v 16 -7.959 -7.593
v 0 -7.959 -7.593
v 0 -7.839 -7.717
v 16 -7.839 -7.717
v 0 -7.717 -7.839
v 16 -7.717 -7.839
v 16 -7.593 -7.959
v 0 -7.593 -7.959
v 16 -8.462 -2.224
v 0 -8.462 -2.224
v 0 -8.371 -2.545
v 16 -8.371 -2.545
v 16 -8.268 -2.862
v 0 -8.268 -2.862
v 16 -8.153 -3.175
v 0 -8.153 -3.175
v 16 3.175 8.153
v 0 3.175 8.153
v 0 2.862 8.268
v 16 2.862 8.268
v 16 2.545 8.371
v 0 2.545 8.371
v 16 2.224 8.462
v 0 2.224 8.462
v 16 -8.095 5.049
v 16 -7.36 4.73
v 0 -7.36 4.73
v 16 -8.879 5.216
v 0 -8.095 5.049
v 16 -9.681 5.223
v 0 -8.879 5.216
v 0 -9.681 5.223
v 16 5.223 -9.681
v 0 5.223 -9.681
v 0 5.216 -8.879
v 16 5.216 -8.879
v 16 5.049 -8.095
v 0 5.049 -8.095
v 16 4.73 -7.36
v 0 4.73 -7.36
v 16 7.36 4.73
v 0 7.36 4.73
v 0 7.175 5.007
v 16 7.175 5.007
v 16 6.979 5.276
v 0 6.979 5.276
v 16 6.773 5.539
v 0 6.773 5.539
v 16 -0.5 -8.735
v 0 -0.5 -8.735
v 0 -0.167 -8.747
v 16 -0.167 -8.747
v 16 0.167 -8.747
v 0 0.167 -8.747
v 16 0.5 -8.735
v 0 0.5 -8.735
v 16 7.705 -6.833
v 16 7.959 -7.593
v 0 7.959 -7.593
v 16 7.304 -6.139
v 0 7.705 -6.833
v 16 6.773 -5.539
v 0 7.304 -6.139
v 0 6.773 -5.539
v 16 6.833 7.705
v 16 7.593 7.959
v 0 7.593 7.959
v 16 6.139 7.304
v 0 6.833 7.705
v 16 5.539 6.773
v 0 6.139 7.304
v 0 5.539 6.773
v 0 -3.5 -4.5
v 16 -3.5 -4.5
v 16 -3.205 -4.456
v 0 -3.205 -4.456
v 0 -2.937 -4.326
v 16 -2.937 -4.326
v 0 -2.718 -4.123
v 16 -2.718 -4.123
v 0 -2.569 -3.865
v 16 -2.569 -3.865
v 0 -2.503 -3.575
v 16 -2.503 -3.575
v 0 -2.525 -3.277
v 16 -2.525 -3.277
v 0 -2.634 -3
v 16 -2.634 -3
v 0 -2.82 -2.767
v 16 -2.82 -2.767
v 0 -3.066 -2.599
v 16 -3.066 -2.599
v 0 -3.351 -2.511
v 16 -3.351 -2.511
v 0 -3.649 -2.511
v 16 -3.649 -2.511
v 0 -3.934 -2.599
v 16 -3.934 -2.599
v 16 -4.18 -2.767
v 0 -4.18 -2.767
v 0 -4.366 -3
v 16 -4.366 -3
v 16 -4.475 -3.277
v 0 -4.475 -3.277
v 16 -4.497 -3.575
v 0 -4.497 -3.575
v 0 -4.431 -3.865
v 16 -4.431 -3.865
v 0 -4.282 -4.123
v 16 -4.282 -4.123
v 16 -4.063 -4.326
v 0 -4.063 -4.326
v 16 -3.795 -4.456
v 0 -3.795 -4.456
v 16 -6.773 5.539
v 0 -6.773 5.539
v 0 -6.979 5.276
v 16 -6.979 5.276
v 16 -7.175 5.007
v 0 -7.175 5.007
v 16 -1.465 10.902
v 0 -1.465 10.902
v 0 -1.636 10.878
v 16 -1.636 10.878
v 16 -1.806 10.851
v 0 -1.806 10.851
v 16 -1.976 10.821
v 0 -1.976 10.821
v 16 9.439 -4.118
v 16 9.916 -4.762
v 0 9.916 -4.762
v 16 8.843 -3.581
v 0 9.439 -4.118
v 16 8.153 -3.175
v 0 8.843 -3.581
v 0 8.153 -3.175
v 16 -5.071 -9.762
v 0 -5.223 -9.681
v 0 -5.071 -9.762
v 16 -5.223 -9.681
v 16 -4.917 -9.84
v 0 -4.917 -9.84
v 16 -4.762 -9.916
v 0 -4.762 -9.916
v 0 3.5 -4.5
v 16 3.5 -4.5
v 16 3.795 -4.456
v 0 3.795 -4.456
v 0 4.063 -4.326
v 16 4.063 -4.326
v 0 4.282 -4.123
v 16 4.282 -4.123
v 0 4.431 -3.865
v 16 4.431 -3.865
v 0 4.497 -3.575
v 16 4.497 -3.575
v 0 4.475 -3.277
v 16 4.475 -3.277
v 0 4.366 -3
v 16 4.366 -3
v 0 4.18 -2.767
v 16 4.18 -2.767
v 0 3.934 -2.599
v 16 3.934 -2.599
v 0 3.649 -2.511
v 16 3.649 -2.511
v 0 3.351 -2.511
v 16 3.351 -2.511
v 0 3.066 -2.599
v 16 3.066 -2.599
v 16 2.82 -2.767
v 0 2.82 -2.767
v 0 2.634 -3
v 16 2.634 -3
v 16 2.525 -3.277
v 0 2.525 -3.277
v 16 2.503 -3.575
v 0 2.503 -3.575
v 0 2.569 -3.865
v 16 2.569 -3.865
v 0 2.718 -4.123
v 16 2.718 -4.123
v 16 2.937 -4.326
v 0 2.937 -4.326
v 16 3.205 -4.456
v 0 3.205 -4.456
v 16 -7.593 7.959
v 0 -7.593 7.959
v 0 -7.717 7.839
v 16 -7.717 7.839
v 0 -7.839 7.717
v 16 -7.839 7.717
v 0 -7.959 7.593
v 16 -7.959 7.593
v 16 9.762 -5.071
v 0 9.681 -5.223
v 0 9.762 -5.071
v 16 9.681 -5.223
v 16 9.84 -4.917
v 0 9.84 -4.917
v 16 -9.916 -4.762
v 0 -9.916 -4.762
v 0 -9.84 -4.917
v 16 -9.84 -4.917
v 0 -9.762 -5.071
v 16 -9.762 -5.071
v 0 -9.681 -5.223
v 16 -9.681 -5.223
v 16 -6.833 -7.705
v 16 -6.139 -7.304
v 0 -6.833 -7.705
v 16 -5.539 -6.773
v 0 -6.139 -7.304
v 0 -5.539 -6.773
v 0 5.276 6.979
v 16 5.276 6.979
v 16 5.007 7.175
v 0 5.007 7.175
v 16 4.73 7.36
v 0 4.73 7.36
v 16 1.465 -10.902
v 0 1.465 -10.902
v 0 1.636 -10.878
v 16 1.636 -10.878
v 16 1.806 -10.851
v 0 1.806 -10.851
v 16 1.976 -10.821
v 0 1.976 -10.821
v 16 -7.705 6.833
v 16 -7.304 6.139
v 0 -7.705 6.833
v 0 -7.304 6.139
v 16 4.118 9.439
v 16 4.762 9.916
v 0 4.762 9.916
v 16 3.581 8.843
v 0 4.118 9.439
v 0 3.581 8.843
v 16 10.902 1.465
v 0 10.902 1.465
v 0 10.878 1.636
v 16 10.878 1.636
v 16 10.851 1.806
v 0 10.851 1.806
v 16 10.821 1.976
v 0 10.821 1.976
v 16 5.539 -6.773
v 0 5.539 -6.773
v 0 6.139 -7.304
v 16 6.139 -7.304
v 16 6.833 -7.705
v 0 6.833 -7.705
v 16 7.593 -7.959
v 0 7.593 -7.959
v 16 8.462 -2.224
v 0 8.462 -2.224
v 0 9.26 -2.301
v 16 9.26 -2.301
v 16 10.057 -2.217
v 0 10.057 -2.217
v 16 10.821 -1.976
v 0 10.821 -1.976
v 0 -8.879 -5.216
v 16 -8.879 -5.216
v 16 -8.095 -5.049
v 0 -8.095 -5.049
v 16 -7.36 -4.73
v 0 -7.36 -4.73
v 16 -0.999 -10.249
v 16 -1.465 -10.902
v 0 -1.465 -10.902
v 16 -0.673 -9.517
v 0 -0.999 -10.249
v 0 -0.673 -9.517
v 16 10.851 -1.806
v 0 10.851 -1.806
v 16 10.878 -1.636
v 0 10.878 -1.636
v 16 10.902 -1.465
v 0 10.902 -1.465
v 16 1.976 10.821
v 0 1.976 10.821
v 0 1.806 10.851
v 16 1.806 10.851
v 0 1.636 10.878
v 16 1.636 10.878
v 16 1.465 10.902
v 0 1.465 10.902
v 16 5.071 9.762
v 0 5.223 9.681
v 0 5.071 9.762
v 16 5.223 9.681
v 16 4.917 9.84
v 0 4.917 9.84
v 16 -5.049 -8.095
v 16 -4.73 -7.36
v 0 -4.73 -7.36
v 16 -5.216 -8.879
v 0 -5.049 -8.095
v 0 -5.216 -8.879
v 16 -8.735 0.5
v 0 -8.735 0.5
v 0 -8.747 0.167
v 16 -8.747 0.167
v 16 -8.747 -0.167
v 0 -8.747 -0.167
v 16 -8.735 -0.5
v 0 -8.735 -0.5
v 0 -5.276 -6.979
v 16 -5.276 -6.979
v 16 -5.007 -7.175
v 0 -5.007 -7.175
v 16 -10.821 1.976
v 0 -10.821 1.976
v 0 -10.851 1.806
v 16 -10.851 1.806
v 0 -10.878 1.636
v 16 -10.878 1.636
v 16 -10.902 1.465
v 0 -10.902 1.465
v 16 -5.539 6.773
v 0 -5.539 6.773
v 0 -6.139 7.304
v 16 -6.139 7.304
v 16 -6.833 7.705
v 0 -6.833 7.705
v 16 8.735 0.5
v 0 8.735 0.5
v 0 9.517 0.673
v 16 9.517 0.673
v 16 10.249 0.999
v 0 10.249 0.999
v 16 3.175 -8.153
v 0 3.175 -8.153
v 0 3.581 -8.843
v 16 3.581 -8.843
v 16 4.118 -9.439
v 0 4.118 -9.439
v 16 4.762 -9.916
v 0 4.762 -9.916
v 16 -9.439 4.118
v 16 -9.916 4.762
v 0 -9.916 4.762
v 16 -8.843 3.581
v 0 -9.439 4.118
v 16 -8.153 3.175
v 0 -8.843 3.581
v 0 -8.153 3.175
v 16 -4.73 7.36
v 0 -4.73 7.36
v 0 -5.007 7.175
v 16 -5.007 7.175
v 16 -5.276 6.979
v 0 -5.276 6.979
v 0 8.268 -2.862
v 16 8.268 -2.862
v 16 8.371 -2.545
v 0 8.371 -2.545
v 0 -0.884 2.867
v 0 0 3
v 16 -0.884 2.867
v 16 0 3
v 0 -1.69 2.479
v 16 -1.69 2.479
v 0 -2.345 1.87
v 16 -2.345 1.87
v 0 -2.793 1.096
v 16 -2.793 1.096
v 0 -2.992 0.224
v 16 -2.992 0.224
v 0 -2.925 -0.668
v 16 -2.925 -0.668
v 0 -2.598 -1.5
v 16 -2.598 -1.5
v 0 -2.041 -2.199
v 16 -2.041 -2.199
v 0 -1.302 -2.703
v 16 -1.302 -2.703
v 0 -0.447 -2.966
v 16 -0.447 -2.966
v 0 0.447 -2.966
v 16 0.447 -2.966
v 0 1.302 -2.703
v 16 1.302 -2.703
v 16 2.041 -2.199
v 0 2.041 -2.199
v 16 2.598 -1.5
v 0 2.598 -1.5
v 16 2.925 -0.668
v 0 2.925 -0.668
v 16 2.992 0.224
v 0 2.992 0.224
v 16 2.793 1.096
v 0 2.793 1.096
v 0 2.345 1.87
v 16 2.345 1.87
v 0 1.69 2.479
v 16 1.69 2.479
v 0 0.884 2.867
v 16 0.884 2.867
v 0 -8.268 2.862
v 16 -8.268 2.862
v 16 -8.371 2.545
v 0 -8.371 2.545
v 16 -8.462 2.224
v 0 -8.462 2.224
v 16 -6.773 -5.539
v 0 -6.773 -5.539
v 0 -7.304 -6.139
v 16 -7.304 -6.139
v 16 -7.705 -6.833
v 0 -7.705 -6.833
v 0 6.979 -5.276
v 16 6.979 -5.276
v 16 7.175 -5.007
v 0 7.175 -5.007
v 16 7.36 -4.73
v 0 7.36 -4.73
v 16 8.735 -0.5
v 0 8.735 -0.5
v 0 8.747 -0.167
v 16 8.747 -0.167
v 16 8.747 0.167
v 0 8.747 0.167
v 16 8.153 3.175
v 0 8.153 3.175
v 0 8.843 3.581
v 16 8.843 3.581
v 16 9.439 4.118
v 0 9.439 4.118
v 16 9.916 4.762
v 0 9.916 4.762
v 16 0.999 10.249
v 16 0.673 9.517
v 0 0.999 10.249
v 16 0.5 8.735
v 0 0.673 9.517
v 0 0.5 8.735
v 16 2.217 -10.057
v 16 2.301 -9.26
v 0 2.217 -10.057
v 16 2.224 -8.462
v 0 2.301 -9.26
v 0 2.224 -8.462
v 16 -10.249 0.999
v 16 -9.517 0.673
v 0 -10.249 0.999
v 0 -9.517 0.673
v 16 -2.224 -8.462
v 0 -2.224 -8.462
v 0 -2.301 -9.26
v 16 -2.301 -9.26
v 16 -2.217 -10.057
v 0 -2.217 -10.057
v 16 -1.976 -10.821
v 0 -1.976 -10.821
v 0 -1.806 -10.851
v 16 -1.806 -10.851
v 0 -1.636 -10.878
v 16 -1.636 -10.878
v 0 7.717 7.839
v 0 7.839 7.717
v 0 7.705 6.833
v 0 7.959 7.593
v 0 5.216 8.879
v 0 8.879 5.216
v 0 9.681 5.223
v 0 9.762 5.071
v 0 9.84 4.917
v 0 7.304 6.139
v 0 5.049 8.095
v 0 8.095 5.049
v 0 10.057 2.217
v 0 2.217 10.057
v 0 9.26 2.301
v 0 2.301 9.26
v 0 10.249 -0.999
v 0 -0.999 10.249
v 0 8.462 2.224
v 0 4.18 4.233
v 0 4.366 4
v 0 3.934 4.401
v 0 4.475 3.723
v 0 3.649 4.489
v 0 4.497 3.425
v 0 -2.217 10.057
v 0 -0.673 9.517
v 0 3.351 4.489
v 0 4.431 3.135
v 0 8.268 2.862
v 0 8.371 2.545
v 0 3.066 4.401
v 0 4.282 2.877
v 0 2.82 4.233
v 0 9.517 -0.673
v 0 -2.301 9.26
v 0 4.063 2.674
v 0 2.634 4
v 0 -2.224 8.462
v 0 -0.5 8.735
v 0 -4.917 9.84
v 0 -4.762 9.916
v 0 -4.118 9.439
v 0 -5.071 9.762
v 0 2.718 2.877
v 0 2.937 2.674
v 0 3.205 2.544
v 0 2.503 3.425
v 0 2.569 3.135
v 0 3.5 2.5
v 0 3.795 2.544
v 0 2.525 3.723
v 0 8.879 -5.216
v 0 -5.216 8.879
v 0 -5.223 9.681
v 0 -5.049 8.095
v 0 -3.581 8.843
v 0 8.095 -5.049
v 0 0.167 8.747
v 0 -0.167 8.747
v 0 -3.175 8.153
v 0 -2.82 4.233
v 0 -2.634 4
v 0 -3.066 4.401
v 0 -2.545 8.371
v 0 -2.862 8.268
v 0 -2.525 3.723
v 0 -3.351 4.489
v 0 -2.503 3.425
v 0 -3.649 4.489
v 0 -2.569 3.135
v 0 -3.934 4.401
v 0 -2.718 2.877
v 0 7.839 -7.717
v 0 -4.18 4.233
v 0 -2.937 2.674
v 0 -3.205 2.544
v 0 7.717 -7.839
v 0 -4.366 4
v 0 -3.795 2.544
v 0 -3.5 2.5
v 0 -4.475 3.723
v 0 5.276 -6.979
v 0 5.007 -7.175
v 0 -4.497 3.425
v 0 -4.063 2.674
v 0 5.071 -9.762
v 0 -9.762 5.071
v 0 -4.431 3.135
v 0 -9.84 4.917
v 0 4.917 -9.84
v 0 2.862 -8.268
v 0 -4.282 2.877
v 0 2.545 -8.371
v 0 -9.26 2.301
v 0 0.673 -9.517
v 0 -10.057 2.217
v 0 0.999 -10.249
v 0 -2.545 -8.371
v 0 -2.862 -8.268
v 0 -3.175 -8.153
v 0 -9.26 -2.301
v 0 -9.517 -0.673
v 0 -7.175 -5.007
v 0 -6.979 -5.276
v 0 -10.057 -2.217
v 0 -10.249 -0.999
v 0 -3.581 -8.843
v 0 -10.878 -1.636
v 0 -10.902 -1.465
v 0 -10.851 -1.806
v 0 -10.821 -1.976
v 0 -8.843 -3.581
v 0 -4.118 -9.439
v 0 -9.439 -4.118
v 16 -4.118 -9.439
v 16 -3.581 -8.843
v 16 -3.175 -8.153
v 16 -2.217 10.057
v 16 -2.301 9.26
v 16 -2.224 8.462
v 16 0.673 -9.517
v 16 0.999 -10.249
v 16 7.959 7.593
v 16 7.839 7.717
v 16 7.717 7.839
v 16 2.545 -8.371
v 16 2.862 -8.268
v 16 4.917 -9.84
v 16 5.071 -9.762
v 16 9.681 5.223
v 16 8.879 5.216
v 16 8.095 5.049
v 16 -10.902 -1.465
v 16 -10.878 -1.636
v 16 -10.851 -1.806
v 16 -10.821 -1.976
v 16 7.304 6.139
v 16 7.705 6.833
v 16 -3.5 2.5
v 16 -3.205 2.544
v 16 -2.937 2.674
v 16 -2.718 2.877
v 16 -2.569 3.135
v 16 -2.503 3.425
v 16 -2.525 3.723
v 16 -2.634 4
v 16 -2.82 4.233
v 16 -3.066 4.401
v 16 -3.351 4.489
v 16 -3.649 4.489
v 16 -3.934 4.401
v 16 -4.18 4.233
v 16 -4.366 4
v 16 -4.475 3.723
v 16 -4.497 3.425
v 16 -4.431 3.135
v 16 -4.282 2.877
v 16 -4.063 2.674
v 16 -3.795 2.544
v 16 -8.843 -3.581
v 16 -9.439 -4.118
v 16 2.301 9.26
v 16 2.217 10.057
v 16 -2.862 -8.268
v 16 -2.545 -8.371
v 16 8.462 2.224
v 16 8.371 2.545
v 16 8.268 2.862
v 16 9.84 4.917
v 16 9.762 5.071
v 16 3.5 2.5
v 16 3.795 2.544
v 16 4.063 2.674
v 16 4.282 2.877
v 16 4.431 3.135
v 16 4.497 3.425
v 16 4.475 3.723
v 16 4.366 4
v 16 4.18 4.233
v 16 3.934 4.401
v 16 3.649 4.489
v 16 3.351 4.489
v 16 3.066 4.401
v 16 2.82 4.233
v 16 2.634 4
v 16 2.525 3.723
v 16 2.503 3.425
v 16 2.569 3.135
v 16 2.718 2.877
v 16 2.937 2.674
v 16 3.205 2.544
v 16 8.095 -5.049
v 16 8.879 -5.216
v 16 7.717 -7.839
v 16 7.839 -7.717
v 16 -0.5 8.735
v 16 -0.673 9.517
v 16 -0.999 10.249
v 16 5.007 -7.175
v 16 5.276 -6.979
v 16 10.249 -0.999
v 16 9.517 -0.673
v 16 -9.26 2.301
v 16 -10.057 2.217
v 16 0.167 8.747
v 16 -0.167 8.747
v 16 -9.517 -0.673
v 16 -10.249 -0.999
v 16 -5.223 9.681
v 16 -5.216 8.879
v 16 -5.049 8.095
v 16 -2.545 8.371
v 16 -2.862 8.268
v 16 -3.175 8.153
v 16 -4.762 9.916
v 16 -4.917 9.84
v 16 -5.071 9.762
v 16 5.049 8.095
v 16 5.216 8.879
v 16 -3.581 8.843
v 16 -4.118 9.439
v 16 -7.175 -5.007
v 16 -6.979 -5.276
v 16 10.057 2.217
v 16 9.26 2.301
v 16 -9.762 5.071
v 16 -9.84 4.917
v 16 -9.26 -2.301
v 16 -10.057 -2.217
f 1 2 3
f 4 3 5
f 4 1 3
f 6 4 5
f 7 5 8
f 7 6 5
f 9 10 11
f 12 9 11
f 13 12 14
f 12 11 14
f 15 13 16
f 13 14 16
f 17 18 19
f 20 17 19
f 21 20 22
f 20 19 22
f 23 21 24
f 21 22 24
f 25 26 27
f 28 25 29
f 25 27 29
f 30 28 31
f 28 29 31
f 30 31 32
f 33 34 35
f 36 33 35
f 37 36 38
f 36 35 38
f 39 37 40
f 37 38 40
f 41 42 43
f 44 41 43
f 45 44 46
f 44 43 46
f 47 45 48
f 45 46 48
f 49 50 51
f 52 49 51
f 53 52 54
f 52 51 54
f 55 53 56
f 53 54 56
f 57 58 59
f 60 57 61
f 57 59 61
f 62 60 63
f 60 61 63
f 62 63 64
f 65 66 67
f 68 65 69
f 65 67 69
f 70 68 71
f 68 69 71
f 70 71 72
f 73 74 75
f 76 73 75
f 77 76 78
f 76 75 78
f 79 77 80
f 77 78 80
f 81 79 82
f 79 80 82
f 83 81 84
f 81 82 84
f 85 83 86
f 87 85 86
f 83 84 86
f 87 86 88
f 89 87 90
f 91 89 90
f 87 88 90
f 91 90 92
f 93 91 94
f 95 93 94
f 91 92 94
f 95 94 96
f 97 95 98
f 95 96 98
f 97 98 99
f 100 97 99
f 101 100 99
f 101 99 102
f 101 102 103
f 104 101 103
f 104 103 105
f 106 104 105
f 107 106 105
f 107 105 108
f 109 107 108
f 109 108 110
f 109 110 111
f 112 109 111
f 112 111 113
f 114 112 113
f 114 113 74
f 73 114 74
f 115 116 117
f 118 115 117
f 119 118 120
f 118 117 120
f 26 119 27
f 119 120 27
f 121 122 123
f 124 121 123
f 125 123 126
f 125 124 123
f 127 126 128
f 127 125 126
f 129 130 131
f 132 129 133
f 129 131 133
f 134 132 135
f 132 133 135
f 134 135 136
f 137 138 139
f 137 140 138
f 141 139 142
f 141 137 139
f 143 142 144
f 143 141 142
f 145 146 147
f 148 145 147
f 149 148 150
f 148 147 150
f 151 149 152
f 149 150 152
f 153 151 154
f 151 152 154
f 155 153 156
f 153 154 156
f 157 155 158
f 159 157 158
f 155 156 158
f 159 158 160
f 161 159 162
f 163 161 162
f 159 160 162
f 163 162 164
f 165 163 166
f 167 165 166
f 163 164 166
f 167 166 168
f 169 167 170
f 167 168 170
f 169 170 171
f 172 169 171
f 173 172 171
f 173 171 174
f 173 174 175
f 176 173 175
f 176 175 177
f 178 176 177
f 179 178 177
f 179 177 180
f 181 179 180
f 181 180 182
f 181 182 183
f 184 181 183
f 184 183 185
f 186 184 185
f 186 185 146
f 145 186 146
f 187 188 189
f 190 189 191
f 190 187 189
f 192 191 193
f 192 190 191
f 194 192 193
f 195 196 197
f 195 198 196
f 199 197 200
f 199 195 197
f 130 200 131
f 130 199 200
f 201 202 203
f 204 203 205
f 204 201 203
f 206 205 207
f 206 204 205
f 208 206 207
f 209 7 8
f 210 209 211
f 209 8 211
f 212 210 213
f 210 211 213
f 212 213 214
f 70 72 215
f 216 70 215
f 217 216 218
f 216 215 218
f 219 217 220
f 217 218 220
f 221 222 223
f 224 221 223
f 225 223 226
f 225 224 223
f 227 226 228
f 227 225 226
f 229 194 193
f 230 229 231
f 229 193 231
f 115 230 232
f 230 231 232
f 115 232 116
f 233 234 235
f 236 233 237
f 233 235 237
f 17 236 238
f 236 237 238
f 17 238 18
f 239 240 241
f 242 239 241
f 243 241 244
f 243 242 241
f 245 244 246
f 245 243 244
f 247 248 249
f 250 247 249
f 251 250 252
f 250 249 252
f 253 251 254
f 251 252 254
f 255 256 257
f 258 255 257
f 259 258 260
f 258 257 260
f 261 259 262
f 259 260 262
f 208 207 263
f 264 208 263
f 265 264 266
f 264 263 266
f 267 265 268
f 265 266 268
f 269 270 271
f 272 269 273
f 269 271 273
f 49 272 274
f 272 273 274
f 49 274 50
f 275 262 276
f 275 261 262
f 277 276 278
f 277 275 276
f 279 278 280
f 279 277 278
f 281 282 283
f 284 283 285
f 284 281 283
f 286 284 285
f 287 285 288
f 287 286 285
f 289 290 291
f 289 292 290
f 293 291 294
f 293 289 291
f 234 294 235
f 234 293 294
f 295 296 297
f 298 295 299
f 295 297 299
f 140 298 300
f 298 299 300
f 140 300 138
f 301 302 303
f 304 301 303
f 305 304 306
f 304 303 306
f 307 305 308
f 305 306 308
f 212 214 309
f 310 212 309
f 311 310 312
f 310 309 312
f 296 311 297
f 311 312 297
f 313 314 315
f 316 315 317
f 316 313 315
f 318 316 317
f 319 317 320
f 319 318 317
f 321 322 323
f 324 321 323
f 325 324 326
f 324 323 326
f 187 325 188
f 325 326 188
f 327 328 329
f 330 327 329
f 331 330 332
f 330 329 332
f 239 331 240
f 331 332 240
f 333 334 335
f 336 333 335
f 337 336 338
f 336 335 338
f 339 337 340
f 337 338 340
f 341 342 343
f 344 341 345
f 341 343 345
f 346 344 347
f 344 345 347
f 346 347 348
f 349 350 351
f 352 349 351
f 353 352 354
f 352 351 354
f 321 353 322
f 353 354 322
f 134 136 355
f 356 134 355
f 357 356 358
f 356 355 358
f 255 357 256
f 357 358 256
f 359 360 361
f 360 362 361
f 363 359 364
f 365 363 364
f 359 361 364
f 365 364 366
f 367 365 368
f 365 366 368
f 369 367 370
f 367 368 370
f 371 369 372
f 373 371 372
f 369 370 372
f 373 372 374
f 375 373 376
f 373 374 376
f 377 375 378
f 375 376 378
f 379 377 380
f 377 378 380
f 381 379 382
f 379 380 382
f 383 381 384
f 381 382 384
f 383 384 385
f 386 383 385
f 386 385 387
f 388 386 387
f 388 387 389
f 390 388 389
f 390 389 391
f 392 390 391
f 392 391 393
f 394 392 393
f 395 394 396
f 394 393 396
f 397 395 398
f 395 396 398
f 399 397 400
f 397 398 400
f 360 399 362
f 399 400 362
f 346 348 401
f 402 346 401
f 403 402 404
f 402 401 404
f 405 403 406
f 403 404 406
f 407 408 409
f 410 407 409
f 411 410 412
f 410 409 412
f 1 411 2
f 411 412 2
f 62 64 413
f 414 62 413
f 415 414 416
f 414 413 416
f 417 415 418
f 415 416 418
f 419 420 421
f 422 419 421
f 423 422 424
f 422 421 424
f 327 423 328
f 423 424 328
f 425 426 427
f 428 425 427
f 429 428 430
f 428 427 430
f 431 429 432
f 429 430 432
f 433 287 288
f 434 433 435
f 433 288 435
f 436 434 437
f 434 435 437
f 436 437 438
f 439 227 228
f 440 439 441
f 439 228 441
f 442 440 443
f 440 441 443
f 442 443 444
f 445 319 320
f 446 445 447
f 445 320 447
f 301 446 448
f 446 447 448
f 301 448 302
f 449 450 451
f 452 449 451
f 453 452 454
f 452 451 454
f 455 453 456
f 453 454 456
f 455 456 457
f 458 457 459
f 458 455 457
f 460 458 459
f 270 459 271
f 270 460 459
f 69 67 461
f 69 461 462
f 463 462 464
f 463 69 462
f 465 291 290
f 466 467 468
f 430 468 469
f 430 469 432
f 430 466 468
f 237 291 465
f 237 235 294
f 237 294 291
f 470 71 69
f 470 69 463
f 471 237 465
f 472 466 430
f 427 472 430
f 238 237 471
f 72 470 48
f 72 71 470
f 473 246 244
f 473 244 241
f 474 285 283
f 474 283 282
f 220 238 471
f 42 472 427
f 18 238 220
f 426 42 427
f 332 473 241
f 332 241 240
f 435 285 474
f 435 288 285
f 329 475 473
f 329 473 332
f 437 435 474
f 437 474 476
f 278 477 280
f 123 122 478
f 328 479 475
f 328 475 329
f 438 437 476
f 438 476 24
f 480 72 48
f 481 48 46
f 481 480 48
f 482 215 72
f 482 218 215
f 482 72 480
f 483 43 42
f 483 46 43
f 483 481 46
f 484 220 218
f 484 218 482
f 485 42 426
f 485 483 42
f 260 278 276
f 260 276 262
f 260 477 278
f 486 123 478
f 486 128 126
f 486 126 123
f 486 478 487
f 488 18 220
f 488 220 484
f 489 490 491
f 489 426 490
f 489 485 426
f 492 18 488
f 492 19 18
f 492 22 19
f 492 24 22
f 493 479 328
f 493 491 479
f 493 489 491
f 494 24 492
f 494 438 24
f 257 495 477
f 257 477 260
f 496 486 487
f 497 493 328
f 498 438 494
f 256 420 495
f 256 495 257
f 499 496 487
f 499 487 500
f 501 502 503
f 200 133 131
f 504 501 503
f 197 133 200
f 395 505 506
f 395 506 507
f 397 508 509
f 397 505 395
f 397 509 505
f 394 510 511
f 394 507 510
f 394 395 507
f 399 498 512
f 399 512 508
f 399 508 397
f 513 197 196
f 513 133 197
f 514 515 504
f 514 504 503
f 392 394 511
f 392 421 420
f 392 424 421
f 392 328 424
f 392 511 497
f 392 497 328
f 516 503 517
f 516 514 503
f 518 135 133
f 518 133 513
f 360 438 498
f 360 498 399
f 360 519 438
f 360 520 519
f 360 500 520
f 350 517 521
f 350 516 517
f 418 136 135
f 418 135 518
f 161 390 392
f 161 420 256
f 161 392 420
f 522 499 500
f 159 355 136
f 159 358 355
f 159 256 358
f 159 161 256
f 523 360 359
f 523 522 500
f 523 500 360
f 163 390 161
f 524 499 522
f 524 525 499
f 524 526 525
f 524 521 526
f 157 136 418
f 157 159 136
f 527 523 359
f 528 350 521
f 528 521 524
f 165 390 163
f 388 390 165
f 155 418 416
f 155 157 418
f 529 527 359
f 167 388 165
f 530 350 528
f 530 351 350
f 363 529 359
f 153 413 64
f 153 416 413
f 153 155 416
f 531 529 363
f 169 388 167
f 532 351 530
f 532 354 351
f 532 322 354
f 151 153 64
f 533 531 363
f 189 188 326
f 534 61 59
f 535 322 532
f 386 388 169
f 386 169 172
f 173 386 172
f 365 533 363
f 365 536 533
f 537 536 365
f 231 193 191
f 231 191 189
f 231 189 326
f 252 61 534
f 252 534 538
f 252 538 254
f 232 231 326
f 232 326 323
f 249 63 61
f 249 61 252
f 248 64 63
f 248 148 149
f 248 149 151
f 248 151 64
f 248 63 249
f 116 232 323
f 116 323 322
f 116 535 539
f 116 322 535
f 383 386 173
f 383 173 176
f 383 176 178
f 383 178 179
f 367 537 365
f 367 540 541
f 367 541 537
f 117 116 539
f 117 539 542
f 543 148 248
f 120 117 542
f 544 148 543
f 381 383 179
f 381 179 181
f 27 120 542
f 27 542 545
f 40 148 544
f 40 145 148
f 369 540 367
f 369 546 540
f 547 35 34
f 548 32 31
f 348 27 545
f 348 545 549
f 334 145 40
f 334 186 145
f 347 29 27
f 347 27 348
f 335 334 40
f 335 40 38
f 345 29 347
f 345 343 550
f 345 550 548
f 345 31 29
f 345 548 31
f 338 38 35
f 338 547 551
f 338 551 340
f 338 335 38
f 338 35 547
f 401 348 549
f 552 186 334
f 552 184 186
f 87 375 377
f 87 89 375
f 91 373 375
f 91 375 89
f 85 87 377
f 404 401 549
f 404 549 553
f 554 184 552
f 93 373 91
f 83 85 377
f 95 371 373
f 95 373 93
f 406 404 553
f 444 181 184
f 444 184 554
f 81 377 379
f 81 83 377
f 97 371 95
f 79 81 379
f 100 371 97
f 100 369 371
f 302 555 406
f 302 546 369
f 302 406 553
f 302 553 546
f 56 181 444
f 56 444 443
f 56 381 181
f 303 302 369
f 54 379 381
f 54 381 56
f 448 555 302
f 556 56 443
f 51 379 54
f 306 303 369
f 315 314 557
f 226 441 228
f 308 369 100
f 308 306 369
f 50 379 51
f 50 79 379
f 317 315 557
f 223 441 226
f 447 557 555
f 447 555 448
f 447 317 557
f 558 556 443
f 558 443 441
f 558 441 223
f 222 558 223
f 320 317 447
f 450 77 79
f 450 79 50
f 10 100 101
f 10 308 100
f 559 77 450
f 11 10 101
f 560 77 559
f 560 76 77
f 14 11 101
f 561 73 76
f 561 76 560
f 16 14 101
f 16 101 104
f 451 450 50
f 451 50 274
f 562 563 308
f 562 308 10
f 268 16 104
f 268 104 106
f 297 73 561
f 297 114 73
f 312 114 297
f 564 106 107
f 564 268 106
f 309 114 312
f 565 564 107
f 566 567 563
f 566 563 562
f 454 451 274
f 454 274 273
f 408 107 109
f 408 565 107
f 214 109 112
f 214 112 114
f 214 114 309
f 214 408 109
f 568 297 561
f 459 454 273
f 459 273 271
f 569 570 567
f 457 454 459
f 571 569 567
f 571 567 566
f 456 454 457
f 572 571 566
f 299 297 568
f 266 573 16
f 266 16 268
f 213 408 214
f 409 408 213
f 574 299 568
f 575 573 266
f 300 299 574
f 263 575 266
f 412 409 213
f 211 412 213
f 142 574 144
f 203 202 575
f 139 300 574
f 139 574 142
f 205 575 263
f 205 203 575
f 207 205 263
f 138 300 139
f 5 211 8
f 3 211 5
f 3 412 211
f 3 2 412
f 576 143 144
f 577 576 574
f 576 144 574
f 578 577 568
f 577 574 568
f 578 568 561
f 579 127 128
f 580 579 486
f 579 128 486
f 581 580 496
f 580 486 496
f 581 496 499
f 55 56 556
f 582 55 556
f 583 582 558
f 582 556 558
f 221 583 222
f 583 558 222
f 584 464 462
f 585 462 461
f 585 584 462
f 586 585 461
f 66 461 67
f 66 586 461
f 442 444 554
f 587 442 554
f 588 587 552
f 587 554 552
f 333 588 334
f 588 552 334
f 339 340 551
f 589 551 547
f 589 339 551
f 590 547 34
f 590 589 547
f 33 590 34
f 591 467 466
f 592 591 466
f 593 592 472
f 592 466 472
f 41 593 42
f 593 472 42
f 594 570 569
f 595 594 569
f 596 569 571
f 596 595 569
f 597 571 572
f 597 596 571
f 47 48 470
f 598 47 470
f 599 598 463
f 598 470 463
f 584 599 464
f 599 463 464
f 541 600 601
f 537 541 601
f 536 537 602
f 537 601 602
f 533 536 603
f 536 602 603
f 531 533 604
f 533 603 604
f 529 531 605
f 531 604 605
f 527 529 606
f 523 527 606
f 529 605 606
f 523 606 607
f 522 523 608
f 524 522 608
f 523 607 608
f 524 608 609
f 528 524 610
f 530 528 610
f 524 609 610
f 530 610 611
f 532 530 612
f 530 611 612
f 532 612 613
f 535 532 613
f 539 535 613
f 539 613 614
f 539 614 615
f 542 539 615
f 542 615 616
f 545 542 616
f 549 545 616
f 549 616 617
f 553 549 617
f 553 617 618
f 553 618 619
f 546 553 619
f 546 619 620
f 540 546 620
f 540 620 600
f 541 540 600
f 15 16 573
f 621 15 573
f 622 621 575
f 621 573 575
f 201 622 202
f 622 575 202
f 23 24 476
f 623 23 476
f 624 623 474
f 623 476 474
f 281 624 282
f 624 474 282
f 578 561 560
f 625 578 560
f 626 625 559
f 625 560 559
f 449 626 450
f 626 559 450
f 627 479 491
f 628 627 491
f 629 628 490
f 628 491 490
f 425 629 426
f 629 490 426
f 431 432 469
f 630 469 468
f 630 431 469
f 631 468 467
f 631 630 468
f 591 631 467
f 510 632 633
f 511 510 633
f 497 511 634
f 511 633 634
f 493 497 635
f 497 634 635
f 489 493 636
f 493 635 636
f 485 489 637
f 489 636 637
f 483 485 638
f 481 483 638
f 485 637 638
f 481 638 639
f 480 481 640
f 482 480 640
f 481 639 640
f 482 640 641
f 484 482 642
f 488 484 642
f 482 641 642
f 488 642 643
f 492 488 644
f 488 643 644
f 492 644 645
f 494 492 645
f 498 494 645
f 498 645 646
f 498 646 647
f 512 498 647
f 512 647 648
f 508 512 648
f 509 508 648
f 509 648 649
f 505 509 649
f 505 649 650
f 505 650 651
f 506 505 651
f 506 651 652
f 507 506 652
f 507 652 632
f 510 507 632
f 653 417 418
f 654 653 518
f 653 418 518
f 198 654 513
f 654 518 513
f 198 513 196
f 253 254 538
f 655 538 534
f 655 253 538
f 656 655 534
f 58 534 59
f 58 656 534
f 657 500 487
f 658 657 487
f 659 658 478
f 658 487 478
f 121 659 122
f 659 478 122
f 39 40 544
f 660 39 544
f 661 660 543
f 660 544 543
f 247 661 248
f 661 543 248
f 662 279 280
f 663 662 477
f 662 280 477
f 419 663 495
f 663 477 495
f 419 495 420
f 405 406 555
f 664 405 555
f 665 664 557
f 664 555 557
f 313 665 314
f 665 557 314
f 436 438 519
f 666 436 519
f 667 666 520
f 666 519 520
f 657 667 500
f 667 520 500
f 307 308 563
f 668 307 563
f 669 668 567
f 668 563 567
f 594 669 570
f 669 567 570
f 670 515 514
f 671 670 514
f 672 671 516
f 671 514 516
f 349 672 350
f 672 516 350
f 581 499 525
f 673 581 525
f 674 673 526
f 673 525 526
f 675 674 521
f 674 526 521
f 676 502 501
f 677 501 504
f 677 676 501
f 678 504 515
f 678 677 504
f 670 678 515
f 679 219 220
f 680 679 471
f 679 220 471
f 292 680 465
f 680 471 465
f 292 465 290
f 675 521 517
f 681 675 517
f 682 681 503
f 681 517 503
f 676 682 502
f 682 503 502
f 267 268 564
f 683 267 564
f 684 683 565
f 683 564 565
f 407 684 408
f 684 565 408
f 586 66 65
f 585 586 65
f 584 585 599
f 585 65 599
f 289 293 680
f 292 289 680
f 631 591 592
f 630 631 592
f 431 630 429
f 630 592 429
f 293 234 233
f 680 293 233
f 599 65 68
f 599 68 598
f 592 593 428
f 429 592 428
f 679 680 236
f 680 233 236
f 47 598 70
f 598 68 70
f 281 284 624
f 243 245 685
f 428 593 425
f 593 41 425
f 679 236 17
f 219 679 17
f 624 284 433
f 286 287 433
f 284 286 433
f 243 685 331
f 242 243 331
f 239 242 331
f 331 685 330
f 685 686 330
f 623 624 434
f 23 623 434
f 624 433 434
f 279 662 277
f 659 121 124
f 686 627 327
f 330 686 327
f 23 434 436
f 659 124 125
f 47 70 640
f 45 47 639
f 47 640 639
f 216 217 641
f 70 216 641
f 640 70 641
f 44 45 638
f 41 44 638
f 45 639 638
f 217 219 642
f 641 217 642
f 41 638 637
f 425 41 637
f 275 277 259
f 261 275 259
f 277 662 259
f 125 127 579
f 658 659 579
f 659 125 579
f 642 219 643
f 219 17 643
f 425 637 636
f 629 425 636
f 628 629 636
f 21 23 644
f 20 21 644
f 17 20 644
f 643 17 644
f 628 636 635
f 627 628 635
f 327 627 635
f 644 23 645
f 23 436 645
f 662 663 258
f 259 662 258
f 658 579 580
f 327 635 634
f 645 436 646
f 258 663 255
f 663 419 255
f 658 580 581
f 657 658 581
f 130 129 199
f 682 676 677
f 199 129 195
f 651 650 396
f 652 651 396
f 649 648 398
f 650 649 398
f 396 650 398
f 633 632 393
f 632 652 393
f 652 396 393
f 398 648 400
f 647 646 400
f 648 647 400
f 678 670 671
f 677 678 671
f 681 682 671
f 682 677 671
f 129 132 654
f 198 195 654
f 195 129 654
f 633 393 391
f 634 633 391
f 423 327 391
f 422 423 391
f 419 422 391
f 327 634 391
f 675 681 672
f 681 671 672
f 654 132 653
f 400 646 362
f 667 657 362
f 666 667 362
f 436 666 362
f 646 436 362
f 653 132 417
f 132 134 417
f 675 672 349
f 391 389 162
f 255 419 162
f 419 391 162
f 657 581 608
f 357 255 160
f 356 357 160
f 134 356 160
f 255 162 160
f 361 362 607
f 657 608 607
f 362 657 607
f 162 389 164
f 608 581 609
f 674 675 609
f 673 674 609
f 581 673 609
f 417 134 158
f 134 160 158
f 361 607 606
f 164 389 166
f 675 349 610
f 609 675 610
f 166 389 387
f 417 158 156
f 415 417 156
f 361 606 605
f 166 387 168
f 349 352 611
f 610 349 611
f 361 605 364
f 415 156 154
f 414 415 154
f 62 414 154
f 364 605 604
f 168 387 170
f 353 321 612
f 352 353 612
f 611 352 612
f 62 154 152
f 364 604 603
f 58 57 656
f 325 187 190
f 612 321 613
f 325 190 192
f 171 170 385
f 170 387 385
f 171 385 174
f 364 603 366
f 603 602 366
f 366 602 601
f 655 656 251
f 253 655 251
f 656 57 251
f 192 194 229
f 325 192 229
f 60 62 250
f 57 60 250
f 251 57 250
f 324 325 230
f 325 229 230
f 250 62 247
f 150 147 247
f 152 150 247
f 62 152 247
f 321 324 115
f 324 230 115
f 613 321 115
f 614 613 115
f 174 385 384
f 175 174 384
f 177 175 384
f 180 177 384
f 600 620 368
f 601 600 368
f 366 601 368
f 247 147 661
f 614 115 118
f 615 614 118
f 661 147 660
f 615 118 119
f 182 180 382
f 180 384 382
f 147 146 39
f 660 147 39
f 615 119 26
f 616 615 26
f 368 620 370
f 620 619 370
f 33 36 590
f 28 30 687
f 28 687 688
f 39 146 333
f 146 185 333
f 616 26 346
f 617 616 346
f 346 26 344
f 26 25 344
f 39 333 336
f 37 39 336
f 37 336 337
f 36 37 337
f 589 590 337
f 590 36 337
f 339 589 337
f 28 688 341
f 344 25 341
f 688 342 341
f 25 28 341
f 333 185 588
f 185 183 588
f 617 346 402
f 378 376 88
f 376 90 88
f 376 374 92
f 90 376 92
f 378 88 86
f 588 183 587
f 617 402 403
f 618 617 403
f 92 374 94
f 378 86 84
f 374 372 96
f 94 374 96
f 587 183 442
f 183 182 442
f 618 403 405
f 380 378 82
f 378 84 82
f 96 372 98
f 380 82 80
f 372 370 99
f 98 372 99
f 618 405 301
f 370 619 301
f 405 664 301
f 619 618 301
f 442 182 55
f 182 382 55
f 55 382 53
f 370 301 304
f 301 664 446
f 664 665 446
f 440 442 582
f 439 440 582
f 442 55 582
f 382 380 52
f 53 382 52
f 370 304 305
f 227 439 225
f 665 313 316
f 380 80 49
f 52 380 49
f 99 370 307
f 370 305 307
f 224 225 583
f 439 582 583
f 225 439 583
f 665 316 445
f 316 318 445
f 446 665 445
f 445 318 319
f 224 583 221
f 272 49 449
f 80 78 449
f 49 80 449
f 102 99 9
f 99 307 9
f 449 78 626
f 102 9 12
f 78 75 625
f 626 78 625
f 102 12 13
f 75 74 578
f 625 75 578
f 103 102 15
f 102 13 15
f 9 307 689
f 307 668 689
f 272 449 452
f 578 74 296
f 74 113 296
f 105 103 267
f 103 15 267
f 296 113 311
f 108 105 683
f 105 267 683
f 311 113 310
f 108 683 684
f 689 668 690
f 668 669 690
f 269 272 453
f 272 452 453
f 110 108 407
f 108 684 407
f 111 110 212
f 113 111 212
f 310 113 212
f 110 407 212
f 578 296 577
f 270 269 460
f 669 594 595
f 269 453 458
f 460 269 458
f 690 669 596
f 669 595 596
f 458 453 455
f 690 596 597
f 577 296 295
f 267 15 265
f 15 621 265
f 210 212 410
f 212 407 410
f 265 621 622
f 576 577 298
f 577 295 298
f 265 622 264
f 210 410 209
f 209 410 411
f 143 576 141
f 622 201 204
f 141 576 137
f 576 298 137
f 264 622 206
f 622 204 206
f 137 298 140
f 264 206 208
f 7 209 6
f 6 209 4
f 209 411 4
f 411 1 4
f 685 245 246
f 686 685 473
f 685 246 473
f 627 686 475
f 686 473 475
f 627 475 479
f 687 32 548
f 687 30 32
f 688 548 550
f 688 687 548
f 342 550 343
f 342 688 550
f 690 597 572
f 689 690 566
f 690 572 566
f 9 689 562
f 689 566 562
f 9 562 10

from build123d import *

# Parameters (mm, degrees)
BASPROSKE_W        = 16
BASPROSKE_H        = 11
SKETCH1_R          = 1
CUT_EXTRUDE1_DEPTH = 30
TOOTHCUT_DEPTH     = 23.315913604
TEETHCUTS_COUNT    = 20
TEETHCUTS_ANGLE    = 342
BORSKE_R           = 3
BORE_DEPTH         = 50.0000508


with BuildPart() as part:
    # BasProSke → Base-Revolve (revolve)
    with BuildSketch(Plane(origin=(0, 0, 0), x_dir=(1, 0, 0), z_dir=(0, 1, 0)), mode=Mode.PRIVATE) as base_revolve_sk:
        with Locations((8, 5.5)):
            Rectangle(BASPROSKE_W, BASPROSKE_H)
    revolve(base_revolve_sk.sketch.rotate(Axis((-10, 0, 0), (1, 0, 0)), 180), axis=Axis((-10, 0, 0), (1, 0, 0)))

    # Sketch1 → Cut-Extrude1 (cut)
    with BuildSketch(Plane(origin=(16, 0, 0), x_dir=(0, 0, -1), z_dir=(1, 0, 0))):
        with Locations((3.5, 3.5)):
            Circle(SKETCH1_R)
        with Locations((-3.5, 3.5)):
            Circle(SKETCH1_R)
        with Locations((-3.5, -3.5)):
            Circle(SKETCH1_R)
        with Locations((3.5, -3.5)):
            Circle(SKETCH1_R)
    extrude(amount=-CUT_EXTRUDE1_DEPTH, mode=Mode.SUBTRACT)

    # TooCutSke → ToothCut (cut, through all)
    with BuildSketch(Plane(origin=(0, 0, 0), x_dir=(0, 0, -1), z_dir=(1, 0, 0))):
        with BuildLine():
            ThreePointArc((0.499924007, 8.734705318), (0, 8.749), (-0.499924007, 8.734705318))
            ThreePointArc((-0.499924007, 8.734705318), (-0.824302243, 9.905497836), (-1.485192705, 10.924909509))
            ThreePointArc((-1.485192705, 10.924909509), (0, 11.0254), (1.485192705, 10.924909509))
            ThreePointArc((1.485192705, 10.924909509), (0.824302243, 9.905497836), (0.499924007, 8.734705318))
        make_face()
    toothcut = extrude(amount=TOOTHCUT_DEPTH, mode=Mode.SUBTRACT)

    # TeethCuts: ToothCut ×20 about axis
    teethcuts_axis = Axis((-10, 0, 0), (1, 0, 0))
    for i in range(1, TEETHCUTS_COUNT):
        add(toothcut.rotate(teethcuts_axis, i * TEETHCUTS_ANGLE / (TEETHCUTS_COUNT - 1)), mode=Mode.SUBTRACT)

    # BorSke → Bore (cut, symmetric)
    with BuildSketch(Plane(origin=(0, 0, 0), x_dir=(0, 0, -1), z_dir=(1, 0, 0))):
        with Locations(Location((0, 0, 0), (0, 0, 180))):
            Circle(BORSKE_R)
    extrude(amount=BORE_DEPTH, both=True, mode=Mode.SUBTRACT)


solid = part.part
